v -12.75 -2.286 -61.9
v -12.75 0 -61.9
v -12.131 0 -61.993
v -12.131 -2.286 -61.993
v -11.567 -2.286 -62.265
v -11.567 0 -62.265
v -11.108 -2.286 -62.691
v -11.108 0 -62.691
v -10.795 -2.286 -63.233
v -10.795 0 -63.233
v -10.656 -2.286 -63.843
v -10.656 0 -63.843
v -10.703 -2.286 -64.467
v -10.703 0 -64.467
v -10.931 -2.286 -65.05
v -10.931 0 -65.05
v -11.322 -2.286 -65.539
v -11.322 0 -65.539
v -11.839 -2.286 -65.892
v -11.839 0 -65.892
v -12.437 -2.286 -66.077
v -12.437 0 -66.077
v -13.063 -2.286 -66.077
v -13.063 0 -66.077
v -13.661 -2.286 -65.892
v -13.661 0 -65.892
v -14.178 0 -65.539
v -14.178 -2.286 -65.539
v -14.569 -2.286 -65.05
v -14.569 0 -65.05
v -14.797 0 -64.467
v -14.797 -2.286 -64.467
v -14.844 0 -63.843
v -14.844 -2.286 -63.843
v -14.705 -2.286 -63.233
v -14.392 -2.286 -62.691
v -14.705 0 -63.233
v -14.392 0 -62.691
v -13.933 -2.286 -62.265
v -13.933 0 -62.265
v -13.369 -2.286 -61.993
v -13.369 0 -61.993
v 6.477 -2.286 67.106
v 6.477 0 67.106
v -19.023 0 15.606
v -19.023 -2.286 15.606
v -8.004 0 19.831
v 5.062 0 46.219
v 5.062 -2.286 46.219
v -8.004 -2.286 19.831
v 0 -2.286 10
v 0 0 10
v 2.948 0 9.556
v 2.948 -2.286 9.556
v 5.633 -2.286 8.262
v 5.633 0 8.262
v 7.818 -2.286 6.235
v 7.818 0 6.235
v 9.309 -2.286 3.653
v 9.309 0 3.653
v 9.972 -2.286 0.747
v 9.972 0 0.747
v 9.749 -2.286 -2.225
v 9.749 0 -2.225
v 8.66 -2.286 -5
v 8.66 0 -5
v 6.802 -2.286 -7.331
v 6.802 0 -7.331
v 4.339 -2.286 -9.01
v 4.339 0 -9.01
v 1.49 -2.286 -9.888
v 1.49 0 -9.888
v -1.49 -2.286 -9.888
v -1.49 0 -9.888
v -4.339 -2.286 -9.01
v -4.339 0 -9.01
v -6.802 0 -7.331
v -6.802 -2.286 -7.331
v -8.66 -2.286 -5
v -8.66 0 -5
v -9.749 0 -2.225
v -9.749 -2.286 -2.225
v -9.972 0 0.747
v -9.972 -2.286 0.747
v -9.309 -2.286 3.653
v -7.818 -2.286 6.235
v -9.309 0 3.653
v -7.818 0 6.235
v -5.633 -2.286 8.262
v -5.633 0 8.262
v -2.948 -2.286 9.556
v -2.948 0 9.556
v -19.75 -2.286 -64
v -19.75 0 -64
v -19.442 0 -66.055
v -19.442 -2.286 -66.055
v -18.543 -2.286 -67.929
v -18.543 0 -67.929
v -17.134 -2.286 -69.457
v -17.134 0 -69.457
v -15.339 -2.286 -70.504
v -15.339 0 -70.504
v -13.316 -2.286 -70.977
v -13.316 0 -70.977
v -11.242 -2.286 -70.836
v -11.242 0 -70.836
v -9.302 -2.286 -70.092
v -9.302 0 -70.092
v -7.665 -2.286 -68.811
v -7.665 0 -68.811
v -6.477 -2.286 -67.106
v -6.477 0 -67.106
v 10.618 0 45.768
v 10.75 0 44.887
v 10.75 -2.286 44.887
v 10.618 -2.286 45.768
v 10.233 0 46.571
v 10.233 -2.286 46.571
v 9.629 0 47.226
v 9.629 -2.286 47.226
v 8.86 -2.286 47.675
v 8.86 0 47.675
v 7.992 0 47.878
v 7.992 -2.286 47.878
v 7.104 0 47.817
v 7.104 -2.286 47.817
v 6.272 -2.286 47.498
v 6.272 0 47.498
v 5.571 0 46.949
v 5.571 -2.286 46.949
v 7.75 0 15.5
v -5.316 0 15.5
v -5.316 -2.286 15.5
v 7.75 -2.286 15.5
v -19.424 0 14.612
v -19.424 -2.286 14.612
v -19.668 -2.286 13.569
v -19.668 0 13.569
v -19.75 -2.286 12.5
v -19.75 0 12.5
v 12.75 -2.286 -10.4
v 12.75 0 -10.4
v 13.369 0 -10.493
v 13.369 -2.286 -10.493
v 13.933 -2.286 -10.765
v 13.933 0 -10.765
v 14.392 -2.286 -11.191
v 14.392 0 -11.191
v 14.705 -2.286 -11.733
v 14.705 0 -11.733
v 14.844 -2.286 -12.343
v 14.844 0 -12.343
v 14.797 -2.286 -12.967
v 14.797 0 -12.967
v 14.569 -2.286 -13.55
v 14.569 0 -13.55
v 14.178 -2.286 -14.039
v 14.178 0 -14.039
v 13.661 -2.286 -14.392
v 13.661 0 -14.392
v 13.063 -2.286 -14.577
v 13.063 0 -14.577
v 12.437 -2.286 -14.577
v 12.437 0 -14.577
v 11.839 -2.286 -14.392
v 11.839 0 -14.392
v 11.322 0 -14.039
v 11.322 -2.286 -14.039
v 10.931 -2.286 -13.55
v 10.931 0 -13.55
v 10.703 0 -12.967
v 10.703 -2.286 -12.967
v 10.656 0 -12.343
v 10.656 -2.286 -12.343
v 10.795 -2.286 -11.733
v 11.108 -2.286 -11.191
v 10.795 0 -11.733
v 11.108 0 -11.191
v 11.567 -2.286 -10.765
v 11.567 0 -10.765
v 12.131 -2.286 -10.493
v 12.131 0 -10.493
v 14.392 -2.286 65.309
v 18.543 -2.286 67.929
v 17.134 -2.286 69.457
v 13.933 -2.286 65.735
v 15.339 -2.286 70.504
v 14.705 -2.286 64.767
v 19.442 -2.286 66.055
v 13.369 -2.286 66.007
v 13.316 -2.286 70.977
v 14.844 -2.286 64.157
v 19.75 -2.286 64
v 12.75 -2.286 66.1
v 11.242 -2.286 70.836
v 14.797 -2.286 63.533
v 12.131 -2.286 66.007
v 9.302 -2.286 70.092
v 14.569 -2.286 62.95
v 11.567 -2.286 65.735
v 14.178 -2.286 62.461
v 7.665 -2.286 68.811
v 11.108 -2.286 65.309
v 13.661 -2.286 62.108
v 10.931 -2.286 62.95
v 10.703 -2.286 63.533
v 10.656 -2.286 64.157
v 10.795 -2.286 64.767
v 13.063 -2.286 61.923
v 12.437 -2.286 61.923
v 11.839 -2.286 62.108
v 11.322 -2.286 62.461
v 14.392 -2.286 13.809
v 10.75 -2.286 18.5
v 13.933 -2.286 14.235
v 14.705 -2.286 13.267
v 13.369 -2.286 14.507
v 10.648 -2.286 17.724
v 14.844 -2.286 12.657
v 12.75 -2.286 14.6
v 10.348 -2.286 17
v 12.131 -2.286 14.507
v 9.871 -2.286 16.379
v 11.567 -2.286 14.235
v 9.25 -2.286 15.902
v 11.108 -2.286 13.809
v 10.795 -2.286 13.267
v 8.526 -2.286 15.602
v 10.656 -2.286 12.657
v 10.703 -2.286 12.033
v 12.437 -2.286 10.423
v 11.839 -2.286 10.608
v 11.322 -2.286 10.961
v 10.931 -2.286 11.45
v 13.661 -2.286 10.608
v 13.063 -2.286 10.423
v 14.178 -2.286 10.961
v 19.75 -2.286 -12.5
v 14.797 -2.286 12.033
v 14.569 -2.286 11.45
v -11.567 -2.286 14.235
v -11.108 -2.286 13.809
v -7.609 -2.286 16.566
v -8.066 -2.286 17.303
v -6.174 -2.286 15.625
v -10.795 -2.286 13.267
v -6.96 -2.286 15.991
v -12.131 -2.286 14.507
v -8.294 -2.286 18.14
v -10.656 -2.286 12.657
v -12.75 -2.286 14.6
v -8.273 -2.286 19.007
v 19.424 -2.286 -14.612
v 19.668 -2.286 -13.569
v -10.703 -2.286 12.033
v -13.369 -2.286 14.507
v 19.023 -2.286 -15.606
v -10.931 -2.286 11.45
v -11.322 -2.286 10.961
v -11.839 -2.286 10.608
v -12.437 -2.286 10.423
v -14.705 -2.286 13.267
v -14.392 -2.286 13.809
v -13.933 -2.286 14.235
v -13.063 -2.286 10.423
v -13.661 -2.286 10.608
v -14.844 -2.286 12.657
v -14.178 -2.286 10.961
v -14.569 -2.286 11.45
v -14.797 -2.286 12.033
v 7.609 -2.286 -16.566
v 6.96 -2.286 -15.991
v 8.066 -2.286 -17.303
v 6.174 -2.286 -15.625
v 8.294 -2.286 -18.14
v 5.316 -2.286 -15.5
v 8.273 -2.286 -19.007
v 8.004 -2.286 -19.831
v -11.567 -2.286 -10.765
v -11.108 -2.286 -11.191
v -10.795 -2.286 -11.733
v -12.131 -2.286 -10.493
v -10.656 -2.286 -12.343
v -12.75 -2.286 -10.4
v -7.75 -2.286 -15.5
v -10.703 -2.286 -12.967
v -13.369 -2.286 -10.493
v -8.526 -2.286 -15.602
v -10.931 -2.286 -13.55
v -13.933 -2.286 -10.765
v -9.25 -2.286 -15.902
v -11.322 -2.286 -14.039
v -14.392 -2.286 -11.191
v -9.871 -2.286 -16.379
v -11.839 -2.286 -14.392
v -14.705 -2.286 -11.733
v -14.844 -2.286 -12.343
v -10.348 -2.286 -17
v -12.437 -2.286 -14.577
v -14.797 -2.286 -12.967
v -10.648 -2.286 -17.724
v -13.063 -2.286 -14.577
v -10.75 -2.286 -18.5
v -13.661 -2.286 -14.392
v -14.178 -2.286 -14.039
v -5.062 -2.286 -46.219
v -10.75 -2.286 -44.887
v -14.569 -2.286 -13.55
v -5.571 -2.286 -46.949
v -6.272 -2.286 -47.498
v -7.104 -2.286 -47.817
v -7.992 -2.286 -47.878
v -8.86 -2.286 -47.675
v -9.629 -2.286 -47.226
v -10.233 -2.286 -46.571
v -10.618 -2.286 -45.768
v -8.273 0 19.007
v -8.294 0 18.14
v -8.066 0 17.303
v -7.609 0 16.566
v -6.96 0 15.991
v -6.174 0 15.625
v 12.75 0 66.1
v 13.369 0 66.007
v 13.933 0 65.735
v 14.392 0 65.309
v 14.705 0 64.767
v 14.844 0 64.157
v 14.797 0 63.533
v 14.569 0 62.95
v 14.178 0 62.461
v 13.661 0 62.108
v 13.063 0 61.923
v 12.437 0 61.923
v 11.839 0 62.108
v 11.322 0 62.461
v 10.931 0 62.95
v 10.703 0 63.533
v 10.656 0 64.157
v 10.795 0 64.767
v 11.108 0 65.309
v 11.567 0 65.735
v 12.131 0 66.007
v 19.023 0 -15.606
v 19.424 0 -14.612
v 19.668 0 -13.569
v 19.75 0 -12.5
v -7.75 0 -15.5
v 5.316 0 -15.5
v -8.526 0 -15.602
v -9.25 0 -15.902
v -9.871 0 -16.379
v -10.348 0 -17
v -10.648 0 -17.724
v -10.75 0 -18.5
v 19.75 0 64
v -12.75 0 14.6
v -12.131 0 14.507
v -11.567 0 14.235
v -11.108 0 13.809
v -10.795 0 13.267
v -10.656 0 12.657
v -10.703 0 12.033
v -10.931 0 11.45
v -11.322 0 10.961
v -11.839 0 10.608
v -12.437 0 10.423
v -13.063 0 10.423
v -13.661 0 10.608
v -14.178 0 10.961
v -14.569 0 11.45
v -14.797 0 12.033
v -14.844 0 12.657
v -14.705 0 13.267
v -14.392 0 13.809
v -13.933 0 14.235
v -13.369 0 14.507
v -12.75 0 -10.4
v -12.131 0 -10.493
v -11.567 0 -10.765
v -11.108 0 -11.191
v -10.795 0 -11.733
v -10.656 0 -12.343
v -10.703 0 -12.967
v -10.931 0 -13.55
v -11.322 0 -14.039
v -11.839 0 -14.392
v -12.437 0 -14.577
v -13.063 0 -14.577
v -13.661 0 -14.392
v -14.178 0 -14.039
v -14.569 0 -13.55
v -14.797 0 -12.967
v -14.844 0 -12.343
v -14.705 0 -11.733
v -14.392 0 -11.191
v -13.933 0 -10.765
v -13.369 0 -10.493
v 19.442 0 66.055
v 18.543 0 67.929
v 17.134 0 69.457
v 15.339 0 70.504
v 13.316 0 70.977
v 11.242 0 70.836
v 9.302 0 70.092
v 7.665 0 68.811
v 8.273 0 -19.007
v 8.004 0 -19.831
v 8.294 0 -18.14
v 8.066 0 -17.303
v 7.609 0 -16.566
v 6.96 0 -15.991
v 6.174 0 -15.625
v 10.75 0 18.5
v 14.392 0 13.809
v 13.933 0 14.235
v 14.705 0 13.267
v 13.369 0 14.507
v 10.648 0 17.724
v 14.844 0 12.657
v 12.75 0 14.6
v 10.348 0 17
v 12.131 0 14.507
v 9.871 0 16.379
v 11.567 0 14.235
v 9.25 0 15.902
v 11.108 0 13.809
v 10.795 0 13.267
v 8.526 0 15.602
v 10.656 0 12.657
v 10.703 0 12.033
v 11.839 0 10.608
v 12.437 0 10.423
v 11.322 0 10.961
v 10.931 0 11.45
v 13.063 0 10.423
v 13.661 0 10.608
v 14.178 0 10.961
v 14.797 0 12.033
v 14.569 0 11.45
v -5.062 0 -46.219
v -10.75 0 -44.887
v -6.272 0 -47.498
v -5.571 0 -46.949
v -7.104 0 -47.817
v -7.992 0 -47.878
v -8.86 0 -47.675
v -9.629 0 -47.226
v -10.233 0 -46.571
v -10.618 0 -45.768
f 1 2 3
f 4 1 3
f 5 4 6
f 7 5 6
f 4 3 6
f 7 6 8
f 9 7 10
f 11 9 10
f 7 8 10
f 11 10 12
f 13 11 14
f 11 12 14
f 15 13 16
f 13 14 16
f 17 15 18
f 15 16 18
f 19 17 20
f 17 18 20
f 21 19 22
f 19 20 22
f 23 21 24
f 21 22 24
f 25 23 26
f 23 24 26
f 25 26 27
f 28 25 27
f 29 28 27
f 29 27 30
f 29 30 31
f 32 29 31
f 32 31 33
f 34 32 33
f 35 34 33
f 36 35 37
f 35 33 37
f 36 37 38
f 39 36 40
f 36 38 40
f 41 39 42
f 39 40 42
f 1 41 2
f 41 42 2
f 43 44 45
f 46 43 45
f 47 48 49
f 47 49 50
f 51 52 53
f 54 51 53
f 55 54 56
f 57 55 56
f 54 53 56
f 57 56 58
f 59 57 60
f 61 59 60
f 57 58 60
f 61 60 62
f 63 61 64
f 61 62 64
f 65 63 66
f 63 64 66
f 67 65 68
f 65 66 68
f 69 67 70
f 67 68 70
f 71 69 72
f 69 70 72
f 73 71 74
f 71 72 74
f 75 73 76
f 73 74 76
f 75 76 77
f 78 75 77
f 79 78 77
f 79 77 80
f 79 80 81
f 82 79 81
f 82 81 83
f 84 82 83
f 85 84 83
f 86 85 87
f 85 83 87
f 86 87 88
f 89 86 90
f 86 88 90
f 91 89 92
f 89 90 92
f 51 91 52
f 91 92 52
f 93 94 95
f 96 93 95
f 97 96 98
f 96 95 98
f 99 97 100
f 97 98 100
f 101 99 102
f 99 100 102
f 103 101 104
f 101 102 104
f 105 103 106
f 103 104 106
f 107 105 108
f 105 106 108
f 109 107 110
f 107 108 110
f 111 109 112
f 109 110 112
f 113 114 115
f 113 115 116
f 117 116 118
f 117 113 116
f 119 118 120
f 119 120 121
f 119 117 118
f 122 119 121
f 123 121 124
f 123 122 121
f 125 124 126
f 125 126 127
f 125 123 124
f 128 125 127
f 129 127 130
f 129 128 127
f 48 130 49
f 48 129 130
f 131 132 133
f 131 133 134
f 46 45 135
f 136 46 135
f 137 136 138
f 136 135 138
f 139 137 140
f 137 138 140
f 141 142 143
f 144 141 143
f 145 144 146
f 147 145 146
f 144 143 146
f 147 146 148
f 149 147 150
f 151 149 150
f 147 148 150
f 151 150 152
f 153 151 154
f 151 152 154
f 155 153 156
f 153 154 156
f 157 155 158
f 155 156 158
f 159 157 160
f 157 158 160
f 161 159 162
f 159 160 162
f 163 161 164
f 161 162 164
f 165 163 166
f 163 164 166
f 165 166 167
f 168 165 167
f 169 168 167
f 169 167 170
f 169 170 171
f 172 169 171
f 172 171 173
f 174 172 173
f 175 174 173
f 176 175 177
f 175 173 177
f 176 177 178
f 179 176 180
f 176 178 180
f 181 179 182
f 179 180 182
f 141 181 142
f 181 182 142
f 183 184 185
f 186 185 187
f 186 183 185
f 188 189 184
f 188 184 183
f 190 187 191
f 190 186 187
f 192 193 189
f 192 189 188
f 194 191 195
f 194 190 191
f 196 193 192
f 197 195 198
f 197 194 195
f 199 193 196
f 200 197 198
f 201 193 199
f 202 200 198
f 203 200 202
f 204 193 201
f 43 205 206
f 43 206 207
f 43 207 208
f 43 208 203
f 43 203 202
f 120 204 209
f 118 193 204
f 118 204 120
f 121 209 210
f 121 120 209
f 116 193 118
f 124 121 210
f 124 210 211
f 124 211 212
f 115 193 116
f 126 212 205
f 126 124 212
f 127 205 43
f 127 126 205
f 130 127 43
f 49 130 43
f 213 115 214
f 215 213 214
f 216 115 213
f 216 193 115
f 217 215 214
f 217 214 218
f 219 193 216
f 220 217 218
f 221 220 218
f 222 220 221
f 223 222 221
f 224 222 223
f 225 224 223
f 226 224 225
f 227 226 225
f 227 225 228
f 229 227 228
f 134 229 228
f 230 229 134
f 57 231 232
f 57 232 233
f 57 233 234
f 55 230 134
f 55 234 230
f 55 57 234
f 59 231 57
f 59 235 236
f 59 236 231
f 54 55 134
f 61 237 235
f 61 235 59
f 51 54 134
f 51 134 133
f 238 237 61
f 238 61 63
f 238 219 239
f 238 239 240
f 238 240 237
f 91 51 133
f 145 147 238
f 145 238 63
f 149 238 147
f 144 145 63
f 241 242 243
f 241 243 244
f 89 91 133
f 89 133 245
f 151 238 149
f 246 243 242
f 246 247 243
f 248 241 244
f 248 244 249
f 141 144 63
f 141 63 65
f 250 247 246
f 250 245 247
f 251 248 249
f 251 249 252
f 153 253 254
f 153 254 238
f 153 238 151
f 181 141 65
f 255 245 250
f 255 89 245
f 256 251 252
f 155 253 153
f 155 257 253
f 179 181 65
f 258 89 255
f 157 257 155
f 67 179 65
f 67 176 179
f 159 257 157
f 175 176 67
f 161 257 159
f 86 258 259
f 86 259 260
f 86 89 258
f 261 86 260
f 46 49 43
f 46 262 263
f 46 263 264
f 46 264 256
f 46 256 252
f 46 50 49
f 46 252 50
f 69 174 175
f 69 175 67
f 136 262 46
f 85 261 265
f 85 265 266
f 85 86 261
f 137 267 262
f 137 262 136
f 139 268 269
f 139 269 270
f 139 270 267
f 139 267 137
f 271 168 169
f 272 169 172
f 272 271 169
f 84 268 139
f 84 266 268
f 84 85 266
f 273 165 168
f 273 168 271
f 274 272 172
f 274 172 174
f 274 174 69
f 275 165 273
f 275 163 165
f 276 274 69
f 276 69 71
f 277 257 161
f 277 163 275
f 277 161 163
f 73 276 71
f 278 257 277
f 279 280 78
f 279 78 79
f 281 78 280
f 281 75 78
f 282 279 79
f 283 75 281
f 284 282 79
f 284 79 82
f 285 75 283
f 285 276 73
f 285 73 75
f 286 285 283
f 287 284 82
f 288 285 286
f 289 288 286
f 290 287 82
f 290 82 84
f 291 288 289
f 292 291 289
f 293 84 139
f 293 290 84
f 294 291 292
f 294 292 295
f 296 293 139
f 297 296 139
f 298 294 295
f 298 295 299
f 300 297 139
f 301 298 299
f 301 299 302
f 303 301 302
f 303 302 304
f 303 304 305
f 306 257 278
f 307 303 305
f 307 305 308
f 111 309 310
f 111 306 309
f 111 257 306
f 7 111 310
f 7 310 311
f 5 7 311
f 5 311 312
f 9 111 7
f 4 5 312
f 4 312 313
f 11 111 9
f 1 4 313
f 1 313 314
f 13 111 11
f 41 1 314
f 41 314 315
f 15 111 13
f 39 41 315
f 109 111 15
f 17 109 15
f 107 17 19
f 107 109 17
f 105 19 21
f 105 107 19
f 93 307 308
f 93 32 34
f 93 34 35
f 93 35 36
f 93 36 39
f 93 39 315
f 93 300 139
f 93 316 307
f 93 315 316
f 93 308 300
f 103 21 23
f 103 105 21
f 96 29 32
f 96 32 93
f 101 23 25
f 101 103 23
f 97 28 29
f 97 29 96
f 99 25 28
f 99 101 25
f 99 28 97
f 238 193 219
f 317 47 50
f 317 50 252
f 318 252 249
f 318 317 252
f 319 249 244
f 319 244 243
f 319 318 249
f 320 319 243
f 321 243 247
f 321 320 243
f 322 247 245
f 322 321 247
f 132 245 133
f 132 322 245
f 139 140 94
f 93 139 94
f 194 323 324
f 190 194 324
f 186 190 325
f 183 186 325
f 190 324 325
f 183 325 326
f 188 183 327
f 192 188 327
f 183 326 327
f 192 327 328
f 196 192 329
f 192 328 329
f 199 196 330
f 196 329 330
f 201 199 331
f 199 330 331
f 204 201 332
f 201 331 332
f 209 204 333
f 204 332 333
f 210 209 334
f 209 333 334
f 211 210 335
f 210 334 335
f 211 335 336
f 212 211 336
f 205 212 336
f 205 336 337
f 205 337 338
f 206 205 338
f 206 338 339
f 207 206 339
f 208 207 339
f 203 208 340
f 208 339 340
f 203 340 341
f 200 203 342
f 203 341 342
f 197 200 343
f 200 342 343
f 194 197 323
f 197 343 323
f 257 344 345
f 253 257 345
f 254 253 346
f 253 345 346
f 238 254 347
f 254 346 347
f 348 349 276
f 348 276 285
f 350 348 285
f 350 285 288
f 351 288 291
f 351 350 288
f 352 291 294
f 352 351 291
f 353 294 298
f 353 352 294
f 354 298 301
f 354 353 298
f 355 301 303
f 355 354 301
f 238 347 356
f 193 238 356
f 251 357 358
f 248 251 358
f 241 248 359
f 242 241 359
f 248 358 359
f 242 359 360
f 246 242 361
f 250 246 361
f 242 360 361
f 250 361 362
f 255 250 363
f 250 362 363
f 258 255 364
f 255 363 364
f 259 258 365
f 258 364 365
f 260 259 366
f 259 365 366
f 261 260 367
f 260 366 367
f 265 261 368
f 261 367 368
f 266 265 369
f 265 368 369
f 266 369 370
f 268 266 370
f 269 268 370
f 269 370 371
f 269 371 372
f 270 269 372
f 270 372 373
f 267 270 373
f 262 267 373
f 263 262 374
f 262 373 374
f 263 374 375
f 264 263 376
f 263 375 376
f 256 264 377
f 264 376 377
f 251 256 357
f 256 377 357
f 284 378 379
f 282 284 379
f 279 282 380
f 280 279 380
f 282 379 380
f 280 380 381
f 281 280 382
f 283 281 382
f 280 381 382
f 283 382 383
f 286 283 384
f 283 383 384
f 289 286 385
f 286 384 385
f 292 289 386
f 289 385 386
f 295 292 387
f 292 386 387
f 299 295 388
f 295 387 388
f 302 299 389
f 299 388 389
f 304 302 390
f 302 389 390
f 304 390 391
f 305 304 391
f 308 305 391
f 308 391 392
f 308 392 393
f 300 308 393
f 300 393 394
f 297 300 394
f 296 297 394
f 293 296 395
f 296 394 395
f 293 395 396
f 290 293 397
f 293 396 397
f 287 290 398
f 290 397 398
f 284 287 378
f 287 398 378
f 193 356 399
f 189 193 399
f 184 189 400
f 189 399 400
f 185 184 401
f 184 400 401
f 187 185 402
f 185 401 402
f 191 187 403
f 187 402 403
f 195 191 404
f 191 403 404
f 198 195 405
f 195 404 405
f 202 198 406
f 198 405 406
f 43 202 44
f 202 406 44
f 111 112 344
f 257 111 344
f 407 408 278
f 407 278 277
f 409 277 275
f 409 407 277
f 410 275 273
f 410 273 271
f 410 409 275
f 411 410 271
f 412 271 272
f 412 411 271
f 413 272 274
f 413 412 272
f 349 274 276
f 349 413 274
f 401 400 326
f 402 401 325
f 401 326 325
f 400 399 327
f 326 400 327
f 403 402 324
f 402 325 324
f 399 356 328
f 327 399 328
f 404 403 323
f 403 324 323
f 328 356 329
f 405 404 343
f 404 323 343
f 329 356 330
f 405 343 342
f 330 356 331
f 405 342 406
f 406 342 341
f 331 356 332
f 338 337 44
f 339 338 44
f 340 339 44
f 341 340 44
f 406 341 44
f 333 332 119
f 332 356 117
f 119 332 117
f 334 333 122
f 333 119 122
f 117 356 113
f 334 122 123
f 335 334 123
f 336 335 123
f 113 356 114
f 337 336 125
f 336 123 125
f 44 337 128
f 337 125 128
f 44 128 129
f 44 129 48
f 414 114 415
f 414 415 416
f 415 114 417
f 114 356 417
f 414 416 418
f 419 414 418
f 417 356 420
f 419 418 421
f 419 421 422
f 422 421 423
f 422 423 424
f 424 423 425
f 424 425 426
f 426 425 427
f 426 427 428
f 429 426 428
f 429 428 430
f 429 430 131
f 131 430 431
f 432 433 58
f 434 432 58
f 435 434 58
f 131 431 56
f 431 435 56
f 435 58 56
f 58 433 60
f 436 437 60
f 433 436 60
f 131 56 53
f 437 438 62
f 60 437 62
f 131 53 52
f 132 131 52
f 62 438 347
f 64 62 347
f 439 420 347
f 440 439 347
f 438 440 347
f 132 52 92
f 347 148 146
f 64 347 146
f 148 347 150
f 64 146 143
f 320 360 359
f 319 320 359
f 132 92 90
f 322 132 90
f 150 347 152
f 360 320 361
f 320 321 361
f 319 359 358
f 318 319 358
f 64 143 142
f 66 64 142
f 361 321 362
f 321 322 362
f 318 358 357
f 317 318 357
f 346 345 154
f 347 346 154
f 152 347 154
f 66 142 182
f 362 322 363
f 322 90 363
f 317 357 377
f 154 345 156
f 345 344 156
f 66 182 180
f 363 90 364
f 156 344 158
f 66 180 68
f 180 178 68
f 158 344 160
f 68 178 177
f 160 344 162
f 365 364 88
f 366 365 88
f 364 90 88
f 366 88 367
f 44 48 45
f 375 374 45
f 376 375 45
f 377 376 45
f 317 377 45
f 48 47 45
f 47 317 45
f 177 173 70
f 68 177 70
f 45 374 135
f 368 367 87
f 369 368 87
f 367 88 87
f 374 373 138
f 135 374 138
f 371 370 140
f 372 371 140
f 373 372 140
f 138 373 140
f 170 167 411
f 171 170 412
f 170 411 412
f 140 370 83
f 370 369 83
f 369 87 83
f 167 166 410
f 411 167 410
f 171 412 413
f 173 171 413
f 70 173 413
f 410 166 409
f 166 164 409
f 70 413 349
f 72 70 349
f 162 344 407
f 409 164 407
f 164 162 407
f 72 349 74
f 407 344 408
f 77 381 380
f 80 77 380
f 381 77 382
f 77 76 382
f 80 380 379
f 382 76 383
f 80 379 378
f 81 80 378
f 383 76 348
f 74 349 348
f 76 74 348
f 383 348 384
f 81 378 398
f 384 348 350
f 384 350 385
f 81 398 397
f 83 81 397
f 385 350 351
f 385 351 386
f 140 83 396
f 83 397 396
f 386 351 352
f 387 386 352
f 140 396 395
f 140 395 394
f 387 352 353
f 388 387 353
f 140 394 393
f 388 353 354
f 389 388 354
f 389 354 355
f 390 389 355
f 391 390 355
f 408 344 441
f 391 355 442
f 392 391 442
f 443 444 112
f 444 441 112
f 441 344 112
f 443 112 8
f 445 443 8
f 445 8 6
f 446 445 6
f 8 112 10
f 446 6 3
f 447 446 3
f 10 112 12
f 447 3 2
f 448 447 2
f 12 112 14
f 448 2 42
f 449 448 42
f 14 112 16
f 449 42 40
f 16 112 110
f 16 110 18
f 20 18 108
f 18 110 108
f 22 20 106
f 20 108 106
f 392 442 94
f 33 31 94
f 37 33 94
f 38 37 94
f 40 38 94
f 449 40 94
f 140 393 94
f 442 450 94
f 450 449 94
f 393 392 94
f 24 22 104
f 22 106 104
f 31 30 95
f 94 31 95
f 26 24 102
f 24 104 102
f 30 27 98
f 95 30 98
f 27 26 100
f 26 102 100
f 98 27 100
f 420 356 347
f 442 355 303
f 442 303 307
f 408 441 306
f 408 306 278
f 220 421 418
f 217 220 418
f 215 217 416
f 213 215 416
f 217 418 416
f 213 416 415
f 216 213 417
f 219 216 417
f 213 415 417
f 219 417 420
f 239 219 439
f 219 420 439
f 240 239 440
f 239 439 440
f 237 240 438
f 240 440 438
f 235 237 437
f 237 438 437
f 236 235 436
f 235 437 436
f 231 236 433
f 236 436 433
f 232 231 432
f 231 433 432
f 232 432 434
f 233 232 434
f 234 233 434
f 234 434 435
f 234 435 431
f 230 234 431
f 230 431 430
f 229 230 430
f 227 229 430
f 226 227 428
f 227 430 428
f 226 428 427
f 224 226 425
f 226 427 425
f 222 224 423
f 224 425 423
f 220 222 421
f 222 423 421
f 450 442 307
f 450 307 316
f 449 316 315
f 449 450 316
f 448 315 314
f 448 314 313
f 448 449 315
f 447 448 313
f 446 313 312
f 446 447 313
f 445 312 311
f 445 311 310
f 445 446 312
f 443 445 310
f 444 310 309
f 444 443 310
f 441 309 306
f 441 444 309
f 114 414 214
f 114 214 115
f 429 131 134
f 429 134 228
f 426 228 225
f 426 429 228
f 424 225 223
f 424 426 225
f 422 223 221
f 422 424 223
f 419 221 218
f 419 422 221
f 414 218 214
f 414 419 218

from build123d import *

# Parameters (mm, degrees)
SKETCH1_R           = 2.1
SKETCH1_R_2         = 10
BOSS_EXTRUDE1_DEPTH = 2.286


with BuildPart() as part:
    # Sketch1 → Boss-Extrude1 (new body)
    with BuildSketch(Plane(origin=(0, 0, 0), x_dir=(1, 0, 0), z_dir=(0, 1, 0))):
        with BuildLine():
            Line((6.476876236, -67.106109825), (-19.023123764, -15.606109825))
            ThreePointArc((-19.023123764, -15.606109825), (-19.565858946, -14.095013112), (-19.75, -12.5))
            Line((-19.75, -12.5), (-19.75, 64))
            ThreePointArc((-19.75, 64), (-14.345013112, 70.815858946), (-6.476876236, 67.106109825))
            Line((-6.476876236, 67.106109825), (19.023123764, 15.606109825))
            ThreePointArc((19.023123764, 15.606109825), (19.565858946, 14.095013112), (19.75, 12.5))
            Line((19.75, 12.5), (19.75, -64))
            ThreePointArc((19.75, -64), (14.345013112, -70.815858946), (6.476876236, -67.106109825))
        make_face()
        with Locations((-12.75, 64)):
            Circle(SKETCH1_R, mode=Mode.SUBTRACT)
        with Locations((-12.75, 12.5)):
            Circle(SKETCH1_R, mode=Mode.SUBTRACT)
        with Locations((12.75, 12.5)):
            Circle(SKETCH1_R, mode=Mode.SUBTRACT)
        with Locations((12.75, -12.5)):
            Circle(SKETCH1_R, mode=Mode.SUBTRACT)
        with Locations((12.75, -64)):
            Circle(SKETCH1_R, mode=Mode.SUBTRACT)
        with Locations((-12.75, -12.5)):
            Circle(SKETCH1_R, mode=Mode.SUBTRACT)
        Circle(SKETCH1_R_2, mode=Mode.SUBTRACT)
        with BuildLine():
            Line((-5.061518387, 46.218659407), (8.004121842, 19.831189925))
            ThreePointArc((8.004121842, 19.831189925), (7.864519372, 16.917844789), (5.315640229, 15.5))
            Line((5.315640229, 15.5), (-7.75, 15.5))
            ThreePointArc((-7.75, 15.5), (-9.871320344, 16.378679656), (-10.75, 18.5))
            Line((-10.75, 18.5), (-10.75, 44.887469482))
            ThreePointArc((-10.75, 44.887469482), (-8.433577048, 47.808551887), (-5.061518387, 46.218659407))
        make_face(mode=Mode.SUBTRACT)
        with BuildLine():
            Line((5.061518387, -46.218659407), (-8.004121842, -19.831189925))
            ThreePointArc((-8.004121842, -19.831189925), (-7.864519372, -16.917844789), (-5.315640229, -15.5))
            Line((-5.315640229, -15.5), (7.75, -15.5))
            ThreePointArc((7.75, -15.5), (9.871320344, -16.378679656), (10.75, -18.5))
            Line((10.75, -18.5), (10.75, -44.887469482))
            ThreePointArc((10.75, -44.887469482), (8.433577048, -47.808551887), (5.061518387, -46.218659407))
        make_face(mode=Mode.SUBTRACT)
    extrude(amount=-BOSS_EXTRUDE1_DEPTH)


solid = part.part
